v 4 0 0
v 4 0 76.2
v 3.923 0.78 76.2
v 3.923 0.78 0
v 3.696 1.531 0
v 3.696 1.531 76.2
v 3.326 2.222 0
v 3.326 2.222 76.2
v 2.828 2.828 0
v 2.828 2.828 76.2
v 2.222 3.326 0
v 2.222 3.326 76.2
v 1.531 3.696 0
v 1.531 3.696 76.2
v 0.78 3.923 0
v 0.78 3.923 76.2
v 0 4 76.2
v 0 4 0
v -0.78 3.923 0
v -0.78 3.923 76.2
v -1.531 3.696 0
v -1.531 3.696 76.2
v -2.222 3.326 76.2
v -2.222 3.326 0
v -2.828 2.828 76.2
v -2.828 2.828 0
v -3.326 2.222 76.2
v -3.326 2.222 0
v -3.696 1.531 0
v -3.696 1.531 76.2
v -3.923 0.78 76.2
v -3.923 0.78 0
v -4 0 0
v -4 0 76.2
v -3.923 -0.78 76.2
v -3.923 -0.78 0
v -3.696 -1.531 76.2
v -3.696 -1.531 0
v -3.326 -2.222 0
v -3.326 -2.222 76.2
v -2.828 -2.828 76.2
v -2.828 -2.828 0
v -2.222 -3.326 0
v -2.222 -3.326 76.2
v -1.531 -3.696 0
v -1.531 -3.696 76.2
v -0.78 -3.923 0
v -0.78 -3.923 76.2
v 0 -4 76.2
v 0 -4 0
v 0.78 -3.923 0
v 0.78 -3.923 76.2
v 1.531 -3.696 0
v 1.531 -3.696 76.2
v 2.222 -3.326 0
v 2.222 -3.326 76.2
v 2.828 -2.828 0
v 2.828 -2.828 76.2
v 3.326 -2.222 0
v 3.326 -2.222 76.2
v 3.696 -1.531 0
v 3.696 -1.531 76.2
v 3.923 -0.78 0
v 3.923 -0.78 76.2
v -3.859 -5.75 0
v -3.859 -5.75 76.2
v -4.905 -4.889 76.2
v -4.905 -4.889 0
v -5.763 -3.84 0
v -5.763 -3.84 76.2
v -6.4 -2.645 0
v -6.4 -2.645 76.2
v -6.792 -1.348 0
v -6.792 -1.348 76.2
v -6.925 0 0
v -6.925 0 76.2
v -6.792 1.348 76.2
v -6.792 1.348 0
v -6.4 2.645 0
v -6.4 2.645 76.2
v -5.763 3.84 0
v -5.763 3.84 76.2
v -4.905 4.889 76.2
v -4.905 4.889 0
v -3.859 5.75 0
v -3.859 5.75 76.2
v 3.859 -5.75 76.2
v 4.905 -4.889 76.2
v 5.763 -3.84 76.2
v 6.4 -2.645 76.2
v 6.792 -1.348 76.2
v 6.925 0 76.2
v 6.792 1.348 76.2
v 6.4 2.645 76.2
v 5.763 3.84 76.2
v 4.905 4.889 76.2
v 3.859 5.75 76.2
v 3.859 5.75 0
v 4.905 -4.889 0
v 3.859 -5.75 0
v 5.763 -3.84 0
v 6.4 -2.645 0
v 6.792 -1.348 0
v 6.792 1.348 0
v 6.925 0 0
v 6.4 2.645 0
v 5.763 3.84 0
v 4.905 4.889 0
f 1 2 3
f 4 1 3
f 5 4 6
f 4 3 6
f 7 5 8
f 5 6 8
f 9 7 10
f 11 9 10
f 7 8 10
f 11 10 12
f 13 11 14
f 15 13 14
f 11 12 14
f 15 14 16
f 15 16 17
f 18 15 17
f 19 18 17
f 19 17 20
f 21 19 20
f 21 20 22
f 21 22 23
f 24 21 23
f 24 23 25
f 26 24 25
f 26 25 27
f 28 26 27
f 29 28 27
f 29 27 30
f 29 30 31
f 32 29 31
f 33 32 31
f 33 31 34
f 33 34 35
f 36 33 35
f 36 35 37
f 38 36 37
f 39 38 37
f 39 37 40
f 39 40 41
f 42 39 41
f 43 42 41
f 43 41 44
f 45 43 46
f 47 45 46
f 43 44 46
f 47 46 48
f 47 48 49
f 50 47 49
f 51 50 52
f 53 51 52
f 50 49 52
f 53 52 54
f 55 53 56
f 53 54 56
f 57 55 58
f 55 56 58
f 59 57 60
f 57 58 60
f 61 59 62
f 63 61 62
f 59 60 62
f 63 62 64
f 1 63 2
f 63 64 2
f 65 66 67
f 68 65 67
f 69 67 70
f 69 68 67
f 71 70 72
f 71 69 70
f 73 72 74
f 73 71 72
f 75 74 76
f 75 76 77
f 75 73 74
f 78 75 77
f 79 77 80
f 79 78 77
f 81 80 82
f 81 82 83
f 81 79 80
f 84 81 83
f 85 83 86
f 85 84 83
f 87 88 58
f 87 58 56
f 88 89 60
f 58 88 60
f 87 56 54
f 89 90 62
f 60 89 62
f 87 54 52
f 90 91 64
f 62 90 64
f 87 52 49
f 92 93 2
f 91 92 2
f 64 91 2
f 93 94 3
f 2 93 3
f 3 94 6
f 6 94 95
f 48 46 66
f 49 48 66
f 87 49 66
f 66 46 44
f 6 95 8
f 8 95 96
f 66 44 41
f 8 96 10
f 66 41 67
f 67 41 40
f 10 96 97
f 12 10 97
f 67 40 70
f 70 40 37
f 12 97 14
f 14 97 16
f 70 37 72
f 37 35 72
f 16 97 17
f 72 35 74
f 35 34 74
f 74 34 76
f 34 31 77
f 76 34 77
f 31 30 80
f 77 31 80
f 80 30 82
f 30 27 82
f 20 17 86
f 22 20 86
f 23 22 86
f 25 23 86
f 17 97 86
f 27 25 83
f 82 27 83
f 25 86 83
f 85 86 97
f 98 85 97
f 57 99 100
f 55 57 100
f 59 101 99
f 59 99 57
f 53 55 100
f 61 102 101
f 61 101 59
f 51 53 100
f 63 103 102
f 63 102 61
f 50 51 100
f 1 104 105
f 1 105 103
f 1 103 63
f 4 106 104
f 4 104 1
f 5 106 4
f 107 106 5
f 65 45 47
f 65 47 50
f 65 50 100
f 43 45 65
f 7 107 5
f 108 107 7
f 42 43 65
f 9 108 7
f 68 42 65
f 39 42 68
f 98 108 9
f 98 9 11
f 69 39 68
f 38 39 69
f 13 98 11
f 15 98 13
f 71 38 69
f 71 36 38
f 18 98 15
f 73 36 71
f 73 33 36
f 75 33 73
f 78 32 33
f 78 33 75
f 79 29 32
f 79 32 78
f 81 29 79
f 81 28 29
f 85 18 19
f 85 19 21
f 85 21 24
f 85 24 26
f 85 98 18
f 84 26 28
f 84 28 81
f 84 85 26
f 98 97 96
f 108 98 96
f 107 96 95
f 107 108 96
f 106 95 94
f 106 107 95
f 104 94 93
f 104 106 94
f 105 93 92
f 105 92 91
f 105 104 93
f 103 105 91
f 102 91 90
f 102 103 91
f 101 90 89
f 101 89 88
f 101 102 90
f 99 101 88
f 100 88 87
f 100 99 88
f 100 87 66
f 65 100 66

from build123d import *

# Parameters (mm, degrees)
BOSS_EXTRUDE1_DEPTH      = 76.2
F_8_0_8_DIAMETER_HOLE1_D = 8


with BuildPart() as part:
    # Sketch1 → Boss-Extrude1 (new body)
    with BuildSketch(Plane.XY):
        with BuildLine():
            Line((-3.859161178, -5.75), (3.859161178, -5.75))
            ThreePointArc((3.859161178, -5.75), (6.925, 0), (3.859161178, 5.75))
            Line((3.859161178, 5.75), (-3.859161178, 5.75))
            ThreePointArc((-3.859161178, 5.75), (-6.925, 0), (-3.859161178, -5.75))
        make_face()
    extrude(amount=BOSS_EXTRUDE1_DEPTH)

    # Ø8.0 (8) Diameter Hole1 (through all)
    with Locations(Plane(origin=(0, 0, 0), x_dir=(-1, 0, 0), z_dir=(0, 0, -1))):
        with Locations((0, 0)):
            Hole(F_8_0_8_DIAMETER_HOLE1_D / 2)


solid = part.part
